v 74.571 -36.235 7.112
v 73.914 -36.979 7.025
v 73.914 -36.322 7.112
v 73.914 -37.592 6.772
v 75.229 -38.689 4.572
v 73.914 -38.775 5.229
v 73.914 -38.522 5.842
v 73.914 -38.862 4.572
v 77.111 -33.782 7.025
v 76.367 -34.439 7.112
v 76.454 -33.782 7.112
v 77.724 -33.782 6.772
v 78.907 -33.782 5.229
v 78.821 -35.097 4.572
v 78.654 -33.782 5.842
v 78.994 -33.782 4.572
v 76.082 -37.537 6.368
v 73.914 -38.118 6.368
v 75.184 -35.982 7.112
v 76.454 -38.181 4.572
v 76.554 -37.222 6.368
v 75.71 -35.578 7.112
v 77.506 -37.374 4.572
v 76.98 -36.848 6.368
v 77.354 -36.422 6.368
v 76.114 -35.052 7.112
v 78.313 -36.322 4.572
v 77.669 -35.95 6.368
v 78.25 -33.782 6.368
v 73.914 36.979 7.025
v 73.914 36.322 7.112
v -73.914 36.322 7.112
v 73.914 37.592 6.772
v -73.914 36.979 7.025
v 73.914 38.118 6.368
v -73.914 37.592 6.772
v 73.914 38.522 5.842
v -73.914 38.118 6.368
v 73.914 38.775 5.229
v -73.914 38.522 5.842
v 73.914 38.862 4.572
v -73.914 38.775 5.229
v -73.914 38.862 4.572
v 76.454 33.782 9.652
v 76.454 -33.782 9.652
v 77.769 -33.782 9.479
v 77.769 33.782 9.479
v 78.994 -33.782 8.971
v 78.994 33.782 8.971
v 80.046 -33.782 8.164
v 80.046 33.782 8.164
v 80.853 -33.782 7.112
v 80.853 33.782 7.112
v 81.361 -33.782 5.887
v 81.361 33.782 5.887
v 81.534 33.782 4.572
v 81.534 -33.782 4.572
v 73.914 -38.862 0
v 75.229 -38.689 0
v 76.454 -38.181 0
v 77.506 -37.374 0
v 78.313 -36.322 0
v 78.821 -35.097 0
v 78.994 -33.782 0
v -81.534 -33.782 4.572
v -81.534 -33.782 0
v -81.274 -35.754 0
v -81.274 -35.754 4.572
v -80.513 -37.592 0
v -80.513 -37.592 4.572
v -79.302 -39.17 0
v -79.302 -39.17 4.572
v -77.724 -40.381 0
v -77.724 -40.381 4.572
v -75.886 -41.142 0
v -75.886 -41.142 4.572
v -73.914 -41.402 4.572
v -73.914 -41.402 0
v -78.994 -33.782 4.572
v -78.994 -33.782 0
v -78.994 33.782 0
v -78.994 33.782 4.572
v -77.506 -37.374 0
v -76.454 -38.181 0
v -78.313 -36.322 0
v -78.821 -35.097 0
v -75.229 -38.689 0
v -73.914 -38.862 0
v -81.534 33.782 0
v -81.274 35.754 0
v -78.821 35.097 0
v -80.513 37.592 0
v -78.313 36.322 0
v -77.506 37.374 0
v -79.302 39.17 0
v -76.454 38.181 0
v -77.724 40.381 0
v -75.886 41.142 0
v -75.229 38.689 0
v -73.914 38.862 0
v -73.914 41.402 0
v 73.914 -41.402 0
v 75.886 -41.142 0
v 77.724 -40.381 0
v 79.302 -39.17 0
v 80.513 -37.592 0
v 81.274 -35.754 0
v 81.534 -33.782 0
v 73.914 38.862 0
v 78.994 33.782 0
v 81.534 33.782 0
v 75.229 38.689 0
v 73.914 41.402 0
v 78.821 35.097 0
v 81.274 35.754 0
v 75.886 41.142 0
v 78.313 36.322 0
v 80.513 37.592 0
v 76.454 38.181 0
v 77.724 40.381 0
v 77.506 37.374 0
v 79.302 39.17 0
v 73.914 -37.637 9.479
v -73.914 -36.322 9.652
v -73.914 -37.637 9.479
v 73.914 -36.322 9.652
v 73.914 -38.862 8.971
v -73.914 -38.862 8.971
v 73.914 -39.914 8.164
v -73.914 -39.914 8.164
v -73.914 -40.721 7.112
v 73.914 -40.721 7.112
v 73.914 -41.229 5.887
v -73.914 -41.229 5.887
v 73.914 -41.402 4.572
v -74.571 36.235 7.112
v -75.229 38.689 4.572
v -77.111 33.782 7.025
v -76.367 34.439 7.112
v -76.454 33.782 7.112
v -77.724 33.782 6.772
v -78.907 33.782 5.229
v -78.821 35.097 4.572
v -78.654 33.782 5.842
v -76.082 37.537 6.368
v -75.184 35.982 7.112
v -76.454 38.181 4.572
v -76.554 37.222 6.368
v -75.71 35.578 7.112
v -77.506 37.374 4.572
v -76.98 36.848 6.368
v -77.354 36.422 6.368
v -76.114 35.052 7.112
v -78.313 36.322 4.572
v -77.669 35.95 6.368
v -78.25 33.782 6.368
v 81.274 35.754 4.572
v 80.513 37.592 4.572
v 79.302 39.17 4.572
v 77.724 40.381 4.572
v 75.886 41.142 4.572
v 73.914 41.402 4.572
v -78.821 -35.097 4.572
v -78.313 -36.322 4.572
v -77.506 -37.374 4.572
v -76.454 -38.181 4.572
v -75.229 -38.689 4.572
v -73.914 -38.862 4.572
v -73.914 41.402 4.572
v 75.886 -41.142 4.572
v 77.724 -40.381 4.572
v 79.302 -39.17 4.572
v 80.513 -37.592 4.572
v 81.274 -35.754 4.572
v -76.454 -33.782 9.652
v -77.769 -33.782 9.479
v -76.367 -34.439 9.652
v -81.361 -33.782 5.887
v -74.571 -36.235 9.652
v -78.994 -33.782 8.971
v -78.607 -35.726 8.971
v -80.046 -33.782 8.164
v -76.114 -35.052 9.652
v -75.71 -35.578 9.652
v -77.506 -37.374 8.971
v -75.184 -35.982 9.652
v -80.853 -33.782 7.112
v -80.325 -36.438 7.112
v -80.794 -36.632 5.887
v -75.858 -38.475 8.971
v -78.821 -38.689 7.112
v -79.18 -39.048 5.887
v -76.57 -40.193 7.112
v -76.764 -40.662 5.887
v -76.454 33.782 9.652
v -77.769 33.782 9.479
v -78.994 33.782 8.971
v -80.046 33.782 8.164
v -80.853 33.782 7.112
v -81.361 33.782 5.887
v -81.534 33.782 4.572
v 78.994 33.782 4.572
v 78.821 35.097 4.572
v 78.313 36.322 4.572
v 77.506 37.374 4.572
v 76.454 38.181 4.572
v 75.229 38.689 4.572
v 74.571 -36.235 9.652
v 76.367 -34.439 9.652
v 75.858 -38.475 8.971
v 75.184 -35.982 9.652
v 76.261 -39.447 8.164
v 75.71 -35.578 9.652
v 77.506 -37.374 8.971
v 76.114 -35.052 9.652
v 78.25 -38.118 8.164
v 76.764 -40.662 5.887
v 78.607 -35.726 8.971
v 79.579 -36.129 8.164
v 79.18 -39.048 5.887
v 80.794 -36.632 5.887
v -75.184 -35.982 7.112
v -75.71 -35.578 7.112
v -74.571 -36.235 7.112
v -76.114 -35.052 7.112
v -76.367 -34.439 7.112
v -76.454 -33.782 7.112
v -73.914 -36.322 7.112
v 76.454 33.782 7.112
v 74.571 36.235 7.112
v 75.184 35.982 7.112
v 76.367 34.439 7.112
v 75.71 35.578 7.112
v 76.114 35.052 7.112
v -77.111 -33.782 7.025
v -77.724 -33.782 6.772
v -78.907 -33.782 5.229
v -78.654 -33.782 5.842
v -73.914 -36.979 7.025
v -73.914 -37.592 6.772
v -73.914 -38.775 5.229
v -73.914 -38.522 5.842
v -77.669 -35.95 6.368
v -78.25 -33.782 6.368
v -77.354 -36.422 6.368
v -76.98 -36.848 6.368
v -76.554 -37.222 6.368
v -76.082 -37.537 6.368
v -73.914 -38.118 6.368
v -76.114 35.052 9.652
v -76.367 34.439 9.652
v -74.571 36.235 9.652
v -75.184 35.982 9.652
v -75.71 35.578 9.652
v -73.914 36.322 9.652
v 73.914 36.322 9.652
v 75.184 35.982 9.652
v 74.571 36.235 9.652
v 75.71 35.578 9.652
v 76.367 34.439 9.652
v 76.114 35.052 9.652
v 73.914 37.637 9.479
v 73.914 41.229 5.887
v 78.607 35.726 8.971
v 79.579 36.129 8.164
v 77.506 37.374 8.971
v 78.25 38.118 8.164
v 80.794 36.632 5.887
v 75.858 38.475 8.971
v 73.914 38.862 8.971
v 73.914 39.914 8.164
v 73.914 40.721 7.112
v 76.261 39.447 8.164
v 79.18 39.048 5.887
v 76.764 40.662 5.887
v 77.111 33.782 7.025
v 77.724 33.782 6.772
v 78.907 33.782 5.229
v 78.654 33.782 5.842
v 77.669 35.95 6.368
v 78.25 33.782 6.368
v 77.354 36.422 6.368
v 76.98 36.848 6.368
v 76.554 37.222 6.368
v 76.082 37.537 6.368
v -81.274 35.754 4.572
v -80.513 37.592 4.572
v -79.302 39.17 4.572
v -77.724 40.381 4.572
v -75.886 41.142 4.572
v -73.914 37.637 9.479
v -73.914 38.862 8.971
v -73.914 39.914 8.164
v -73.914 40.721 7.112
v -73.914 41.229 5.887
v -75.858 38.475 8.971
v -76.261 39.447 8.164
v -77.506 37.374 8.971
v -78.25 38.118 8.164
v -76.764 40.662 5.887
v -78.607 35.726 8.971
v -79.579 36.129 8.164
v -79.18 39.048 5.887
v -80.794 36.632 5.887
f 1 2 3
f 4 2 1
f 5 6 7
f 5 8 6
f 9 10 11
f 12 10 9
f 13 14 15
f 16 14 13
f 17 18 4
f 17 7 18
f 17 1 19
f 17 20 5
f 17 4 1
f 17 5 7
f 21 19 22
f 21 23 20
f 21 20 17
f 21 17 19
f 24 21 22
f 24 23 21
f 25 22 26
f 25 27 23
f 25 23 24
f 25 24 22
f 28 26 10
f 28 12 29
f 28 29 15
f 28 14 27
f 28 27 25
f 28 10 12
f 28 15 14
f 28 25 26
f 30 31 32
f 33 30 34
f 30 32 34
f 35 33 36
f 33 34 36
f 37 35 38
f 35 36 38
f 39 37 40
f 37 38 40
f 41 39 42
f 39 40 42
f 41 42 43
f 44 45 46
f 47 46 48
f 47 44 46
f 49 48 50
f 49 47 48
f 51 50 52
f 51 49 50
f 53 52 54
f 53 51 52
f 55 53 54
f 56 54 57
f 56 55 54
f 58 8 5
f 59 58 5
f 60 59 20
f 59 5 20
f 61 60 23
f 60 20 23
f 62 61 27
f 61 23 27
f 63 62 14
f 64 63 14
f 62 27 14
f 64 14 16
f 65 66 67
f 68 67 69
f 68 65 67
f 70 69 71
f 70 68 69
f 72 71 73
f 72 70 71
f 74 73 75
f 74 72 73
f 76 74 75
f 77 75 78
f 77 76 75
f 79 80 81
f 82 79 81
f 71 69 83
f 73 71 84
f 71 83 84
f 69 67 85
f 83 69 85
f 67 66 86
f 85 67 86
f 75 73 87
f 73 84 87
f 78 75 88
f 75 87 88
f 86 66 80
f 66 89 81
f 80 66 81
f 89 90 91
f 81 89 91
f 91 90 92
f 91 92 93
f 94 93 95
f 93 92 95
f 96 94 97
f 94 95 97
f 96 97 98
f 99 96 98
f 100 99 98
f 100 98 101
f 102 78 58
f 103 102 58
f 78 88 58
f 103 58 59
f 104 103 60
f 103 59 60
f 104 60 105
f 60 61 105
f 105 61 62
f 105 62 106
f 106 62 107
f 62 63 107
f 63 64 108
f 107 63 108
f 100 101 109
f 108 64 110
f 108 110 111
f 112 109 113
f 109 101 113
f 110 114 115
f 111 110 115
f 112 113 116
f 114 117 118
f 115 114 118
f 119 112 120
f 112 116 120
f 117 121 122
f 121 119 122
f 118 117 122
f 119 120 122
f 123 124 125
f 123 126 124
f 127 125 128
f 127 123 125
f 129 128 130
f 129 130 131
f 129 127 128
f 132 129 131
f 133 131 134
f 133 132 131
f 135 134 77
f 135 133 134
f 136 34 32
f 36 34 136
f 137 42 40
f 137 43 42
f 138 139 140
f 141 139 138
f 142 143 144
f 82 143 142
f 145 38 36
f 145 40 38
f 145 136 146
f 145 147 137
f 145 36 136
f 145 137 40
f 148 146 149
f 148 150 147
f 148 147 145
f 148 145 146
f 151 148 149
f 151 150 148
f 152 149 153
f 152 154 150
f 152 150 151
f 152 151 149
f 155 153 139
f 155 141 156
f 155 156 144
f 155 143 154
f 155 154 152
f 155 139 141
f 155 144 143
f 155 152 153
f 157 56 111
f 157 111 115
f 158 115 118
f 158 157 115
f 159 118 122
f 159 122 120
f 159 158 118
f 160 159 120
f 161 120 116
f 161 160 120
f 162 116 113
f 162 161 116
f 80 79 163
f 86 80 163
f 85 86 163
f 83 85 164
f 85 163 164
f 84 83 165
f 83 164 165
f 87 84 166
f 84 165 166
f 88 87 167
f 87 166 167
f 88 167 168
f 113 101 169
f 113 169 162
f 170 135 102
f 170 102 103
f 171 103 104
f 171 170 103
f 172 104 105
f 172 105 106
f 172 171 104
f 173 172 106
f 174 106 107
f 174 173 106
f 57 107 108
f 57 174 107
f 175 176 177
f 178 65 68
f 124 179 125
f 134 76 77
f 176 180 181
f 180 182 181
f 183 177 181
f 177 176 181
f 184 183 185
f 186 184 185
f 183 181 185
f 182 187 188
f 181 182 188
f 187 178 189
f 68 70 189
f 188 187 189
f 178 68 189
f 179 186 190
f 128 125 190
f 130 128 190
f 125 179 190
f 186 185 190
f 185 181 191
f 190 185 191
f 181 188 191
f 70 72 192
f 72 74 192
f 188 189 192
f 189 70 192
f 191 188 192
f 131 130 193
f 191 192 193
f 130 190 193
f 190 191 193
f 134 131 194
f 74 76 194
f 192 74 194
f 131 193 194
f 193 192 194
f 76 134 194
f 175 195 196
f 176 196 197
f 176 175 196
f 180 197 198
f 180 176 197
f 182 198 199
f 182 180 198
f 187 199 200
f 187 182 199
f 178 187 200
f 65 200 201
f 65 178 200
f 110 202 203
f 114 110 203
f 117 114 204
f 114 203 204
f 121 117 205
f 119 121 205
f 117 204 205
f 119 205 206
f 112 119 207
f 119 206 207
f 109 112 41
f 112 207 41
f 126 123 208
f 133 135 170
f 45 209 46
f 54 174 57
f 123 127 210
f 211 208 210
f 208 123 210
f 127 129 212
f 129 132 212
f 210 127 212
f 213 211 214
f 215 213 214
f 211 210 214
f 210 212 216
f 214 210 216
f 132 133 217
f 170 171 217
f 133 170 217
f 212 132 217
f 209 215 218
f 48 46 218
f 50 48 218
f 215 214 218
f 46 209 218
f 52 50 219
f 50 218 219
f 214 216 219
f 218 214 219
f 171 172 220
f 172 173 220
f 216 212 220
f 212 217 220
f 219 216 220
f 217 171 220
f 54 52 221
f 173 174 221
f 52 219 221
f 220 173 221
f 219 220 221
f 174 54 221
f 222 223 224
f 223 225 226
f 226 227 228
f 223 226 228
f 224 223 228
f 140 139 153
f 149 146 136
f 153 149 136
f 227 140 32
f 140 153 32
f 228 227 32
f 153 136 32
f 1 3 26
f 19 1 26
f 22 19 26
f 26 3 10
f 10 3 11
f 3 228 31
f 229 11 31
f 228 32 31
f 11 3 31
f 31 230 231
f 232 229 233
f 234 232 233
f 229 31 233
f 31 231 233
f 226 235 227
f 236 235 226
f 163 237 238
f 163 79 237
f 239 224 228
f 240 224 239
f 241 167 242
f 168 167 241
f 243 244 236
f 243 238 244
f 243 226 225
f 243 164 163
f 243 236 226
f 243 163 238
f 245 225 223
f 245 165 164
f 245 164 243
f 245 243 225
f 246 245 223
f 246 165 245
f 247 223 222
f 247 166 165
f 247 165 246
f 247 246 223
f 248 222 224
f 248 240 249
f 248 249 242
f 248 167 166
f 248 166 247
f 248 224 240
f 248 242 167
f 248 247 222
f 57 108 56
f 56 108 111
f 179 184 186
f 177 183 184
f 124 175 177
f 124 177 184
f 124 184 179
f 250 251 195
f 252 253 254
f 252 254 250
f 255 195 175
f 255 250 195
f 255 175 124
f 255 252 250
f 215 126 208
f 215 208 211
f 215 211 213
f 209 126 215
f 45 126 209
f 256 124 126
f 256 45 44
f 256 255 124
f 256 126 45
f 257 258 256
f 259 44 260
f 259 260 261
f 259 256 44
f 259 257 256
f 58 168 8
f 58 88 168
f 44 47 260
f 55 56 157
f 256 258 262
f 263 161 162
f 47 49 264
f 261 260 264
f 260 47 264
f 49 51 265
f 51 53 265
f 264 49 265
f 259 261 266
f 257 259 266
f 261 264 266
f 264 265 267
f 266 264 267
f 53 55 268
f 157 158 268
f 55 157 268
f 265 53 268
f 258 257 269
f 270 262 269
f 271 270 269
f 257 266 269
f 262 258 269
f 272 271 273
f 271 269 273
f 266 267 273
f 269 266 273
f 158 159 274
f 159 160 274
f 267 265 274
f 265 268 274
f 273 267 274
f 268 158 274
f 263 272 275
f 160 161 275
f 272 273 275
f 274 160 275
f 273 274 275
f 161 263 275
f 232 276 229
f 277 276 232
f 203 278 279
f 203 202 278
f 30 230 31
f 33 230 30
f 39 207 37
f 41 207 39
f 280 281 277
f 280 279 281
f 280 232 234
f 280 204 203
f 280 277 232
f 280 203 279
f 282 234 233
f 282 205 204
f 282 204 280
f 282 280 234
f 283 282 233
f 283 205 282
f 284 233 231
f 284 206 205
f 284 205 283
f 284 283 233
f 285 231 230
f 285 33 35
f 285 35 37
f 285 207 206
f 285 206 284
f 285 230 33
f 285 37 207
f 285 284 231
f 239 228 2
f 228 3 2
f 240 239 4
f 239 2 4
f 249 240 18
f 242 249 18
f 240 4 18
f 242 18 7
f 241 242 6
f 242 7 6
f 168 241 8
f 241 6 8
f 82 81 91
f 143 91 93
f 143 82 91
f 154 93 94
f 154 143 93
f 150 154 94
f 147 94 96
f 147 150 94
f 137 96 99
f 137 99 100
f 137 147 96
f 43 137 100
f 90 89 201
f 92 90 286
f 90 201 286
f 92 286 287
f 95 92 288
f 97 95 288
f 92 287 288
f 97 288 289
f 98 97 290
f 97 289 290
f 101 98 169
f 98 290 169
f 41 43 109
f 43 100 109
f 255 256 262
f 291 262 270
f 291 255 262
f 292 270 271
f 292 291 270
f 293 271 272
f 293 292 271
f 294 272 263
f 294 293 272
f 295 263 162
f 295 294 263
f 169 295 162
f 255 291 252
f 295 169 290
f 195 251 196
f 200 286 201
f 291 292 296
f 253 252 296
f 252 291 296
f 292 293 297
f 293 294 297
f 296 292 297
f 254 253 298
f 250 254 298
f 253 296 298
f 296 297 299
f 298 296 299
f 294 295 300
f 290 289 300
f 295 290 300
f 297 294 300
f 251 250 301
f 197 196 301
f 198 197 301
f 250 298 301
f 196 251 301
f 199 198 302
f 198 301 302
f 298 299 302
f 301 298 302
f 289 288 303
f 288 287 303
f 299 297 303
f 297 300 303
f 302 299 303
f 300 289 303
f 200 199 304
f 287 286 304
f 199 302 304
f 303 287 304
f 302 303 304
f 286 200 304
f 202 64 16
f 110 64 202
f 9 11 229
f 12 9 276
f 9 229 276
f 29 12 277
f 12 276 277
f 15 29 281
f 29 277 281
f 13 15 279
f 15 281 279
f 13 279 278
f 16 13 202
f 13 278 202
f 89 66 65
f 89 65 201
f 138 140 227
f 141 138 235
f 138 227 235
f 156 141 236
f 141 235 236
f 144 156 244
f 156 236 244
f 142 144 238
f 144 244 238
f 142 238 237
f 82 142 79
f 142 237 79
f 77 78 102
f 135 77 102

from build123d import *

# Parameters (mm, degrees)
F0_W     = 163.068
F0_H     = 82.804
F1_DEPTH = 9.652
F2_R     = 7.62
F3_R     = 5.08
F4_T     = -2.54


with BuildPart() as f1:
    # F0 (on Top) → F1 (new body)
    with BuildSketch(Plane.XY):
        Rectangle(F0_W, F0_H)
    extrude(amount=F1_DEPTH)

    # F2
    f2_edges = [f1.edges().sort_by_distance(p)[0] for p in [
        (-81.534, 41.402, 4.826),
        (-81.534, -41.402, 4.826),
        (81.534, 41.402, 4.826),
        (81.534, -41.402, 4.826),
    ]]
    fillet(f2_edges, radius=F2_R)

    # F3
    f3_edges = [f1.edges().sort_by_distance(p)[0] for p in [
        (0, -41.402, 9.652),
        (-79.302154, -39.170154, 9.652),
        (79.302154, -39.170154, 9.652),
        (-81.534, 0, 9.652),
        (81.534, 0, 9.652),
        (-79.302154, 39.170154, 9.652),
        (79.302154, 39.170154, 9.652),
        (0, 41.402, 9.652),
    ]]
    fillet(f3_edges, radius=F3_R)

    # F4
    f4_openings = [f1.faces().sort_by_distance(p)[0] for p in [
        (0, 0, 0),
    ]]
    offset(amount=F4_T, openings=f4_openings)


solid = f1.part
